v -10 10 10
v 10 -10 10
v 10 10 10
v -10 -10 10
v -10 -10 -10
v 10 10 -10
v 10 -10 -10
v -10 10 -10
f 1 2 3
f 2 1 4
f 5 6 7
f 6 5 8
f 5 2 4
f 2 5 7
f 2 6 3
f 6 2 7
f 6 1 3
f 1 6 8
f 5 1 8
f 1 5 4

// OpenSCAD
// A simple cube.
// Render with: openscad -o cube.stl cube.scad

size = 20;      // edge length in mm
centered = true; // center on the origin instead of the first octant

cube(size, center = centered);
